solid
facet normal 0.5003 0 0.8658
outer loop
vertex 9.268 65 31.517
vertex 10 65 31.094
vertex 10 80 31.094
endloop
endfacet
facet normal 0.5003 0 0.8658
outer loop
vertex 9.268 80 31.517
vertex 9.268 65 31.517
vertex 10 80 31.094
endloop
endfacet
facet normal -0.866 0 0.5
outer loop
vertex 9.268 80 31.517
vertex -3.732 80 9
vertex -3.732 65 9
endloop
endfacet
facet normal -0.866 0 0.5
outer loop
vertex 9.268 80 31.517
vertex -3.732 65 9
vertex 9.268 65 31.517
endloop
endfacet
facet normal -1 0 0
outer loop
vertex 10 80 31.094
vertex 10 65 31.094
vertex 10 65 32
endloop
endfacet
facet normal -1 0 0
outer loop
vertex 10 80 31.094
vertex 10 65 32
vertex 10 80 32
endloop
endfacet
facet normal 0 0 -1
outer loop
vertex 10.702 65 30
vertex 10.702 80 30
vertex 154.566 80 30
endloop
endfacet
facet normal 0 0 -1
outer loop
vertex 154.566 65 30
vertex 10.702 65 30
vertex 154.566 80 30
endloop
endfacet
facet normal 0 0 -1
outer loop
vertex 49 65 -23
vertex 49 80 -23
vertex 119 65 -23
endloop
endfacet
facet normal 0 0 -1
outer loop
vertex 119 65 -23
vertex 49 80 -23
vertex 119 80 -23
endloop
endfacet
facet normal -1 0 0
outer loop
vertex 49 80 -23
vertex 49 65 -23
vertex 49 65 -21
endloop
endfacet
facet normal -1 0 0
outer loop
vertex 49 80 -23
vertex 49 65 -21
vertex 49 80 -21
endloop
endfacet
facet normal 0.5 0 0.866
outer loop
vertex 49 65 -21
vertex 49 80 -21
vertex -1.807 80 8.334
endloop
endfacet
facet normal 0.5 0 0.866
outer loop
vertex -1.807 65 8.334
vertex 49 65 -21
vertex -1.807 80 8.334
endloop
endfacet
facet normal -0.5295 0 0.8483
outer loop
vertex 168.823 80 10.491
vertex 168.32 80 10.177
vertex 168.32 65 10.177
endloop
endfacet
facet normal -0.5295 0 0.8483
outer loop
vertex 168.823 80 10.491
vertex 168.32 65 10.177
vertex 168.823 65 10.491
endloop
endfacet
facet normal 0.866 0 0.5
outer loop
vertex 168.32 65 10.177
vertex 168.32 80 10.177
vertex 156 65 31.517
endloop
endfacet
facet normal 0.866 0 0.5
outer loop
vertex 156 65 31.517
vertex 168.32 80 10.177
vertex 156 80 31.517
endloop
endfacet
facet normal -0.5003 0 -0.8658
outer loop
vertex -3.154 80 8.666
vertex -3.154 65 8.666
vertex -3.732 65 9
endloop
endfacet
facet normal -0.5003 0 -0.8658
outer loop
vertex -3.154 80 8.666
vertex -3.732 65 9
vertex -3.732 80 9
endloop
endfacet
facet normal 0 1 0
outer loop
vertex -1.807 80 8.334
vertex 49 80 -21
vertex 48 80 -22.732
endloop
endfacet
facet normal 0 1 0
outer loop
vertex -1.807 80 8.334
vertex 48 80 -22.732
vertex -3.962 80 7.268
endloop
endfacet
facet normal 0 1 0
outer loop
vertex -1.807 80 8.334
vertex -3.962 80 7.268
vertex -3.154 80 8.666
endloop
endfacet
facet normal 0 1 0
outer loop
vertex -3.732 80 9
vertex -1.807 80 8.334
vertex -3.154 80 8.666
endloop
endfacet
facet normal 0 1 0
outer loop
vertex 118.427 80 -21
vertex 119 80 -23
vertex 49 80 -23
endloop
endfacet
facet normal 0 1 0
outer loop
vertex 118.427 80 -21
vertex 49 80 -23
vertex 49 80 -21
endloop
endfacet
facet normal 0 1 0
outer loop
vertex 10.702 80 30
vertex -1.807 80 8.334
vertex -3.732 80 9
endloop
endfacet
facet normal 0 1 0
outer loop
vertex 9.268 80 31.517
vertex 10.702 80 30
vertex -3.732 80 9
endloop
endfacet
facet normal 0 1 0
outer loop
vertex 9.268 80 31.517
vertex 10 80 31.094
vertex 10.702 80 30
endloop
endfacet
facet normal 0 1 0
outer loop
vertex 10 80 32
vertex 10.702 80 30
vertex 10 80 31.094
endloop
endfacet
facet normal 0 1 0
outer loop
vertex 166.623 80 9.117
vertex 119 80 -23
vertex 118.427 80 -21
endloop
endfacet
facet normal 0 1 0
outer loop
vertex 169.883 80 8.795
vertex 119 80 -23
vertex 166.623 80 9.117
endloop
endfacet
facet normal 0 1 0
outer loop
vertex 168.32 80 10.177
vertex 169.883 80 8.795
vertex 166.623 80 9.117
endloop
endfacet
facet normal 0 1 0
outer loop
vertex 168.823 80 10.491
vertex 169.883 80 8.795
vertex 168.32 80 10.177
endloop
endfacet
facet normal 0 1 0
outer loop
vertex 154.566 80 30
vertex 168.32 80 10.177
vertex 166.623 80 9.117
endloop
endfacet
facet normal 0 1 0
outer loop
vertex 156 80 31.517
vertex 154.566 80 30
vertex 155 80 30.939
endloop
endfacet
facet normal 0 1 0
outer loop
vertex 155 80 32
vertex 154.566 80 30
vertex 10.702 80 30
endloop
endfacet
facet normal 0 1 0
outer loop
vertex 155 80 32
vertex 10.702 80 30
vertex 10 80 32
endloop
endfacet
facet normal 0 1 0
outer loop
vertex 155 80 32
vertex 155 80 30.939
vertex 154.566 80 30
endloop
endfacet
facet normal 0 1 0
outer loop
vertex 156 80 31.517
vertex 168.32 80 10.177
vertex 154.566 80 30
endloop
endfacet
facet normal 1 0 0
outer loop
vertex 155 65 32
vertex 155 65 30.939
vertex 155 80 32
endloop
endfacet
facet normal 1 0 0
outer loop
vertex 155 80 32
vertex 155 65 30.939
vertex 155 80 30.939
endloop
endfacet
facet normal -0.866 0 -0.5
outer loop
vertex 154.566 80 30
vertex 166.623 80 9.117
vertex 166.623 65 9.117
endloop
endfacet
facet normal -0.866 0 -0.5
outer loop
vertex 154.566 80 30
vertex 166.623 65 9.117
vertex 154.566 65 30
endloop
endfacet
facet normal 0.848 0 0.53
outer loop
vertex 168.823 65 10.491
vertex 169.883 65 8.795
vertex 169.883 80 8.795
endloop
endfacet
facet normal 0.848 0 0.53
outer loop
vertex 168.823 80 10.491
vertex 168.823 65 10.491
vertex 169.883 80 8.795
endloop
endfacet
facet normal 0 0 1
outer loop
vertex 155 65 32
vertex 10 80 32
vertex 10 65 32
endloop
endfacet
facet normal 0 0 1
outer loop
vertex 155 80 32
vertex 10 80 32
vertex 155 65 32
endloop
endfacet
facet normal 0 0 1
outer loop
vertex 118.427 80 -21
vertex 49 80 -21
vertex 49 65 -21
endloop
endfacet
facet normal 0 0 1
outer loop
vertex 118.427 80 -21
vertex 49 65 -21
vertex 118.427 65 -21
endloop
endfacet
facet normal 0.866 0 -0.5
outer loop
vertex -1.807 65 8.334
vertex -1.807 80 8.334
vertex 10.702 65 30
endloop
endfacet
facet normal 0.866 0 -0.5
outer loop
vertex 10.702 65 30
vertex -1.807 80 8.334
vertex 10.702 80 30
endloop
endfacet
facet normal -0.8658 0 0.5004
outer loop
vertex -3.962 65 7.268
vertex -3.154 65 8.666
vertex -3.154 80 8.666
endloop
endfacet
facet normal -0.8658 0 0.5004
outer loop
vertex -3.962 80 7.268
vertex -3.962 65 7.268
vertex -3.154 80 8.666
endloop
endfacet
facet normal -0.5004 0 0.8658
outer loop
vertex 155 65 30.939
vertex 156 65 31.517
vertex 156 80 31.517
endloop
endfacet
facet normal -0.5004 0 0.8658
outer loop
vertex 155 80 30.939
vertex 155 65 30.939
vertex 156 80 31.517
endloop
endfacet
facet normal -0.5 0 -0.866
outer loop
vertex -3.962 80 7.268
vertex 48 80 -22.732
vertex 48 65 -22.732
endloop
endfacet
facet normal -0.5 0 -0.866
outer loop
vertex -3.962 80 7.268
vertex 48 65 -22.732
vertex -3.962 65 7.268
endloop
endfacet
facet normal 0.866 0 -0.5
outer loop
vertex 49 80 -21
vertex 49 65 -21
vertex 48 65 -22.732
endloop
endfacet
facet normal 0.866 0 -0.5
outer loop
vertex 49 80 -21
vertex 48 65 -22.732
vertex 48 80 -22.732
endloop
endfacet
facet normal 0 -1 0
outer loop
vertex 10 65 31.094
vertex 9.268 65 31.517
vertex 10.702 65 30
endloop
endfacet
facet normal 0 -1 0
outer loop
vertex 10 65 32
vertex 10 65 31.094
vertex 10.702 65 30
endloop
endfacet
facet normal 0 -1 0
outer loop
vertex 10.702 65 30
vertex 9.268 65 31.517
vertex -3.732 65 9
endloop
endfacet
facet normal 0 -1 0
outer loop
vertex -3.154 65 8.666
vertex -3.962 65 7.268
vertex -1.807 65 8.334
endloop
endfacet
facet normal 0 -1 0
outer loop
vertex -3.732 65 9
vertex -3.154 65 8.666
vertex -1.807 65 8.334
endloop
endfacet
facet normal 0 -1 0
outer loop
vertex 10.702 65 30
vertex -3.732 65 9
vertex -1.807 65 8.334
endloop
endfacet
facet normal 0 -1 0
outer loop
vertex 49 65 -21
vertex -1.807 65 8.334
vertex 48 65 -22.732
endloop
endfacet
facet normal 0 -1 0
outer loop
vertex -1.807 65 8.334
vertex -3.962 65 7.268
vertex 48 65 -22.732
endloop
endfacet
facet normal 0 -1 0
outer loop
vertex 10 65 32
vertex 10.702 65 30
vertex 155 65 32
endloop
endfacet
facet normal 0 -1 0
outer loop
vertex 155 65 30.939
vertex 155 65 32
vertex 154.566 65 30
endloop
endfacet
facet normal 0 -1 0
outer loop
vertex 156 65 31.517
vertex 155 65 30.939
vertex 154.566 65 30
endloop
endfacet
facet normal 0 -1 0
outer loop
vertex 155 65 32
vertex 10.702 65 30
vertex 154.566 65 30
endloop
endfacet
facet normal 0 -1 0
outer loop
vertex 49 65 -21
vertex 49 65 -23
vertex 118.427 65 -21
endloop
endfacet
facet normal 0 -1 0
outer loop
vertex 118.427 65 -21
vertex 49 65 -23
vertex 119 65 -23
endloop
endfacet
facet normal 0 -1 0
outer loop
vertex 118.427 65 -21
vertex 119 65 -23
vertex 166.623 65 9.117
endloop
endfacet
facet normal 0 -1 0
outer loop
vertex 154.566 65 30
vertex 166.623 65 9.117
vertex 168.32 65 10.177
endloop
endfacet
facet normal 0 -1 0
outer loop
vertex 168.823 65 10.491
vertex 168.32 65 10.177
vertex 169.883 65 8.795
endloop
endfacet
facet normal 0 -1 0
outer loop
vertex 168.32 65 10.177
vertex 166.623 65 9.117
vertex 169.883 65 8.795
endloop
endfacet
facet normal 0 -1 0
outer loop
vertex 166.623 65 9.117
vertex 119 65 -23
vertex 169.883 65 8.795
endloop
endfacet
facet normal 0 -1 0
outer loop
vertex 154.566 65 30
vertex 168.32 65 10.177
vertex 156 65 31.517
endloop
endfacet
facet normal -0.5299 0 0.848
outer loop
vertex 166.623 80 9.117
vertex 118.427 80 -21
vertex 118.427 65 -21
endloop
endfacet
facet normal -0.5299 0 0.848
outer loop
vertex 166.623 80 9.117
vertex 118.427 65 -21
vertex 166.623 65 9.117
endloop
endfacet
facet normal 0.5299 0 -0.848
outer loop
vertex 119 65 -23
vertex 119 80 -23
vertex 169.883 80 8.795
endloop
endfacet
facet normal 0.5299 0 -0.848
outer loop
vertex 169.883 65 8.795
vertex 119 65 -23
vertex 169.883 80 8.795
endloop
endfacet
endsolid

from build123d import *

# Parameters (mm, degrees)
BOX001002001_W                     = 70
BOX001002001_H                     = 15
BOX001002001_DEPTH                 = 2
BOX001002001002_W                  = 60
BOX001002001002_H                  = 15
BOX001002001002_DEPTH              = 2
BOX001002001002_PLACEMENT_ANGLE    = 209.99999
BOX001002001001_W                  = 60
BOX001002001001_H                  = 15
BOX001002001001_DEPTH              = 2
BOX001002001001_PITCH_ANGLE        = -31.999951
BOX001002001003_W                  = 26
BOX001002001003_H                  = 15
BOX001002001003_DEPTH              = 2
BOX001002001003_PLACEMENT_ANGLE    = 60.000023
BOX001002001003001_W               = 26
BOX001002001003001_H               = 15
BOX001002001003001_DEPTH           = 2
BOX001002001003001_PLACEMENT_ANGLE = 119.999977
BOX001002_W                        = 145
BOX001002_H                        = 15
BOX001002_DEPTH                    = 2


with BuildPart() as box001002001:
    # Box001002001 → Box001002001 (new body)
    with BuildSketch(Plane(origin=(49, -20, -23), x_dir=(1, 0, 0), z_dir=(0, 0, 1))):
        with Locations((35, 7.5)):
            Rectangle(BOX001002001_W, BOX001002001_H)
    extrude(amount=BOX001002001_DEPTH)


with BuildPart() as box001002001002:
    # Box001002001002 → Box001002001002 (new body)
    with BuildSketch(Plane.XY):
        with Locations((30, 7.5)):
            Rectangle(BOX001002001002_W, BOX001002001002_H)
    extrude(amount=BOX001002001002_DEPTH)


with BuildPart() as box001002001002_1:
    # Box001002001002 placement: moved
    add(box001002001002.part.moved(Location((49, -20, -21))).rotate(Axis((49, -20, -21), (0, 1, 0)), BOX001002001002_PLACEMENT_ANGLE))


with BuildPart() as box001002001001:
    # Box001002001001 → Box001002001001 (new body)
    with BuildSketch(Plane.XY):
        with Locations((30, 7.5)):
            Rectangle(BOX001002001001_W, BOX001002001001_H)
    extrude(amount=BOX001002001001_DEPTH)


with BuildPart() as box001002001001_1:
    # Box001002001001 pitch: moved
    add(box001002001001.part.rotate(Axis((0, 0, 0), (0, 1, 0)), BOX001002001001_PITCH_ANGLE))


with BuildPart() as box001002001001_2:
    # Box001002001001 placement: moved
    add(box001002001001_1.part.moved(Location((119, -20, -23))))


with BuildPart() as box001002001003:
    # Box001002001003 → Box001002001003 (new body)
    with BuildSketch(Plane.XY):
        with Locations((13, 7.5)):
            Rectangle(BOX001002001003_W, BOX001002001003_H)
    extrude(amount=BOX001002001003_DEPTH)


with BuildPart() as box001002001003_1:
    # Box001002001003 placement: moved
    add(box001002001003.part.moved(Location((-2, -20, 8))).rotate(Axis((-2, -20, 8), (0, -1, 0)), BOX001002001003_PLACEMENT_ANGLE))


with BuildPart() as box001002001003001:
    # Box001002001003001 → Box001002001003001 (new body)
    with BuildSketch(Plane.XY):
        with Locations((13, 7.5)):
            Rectangle(BOX001002001003001_W, BOX001002001003001_H)
    extrude(amount=BOX001002001003001_DEPTH)


with BuildPart() as box001002001003001_1:
    # Box001002001003001 placement: moved
    add(box001002001003001.part.moved(Location((169, -20, 9))).rotate(Axis((169, -20, 9), (0, -1, 0)), BOX001002001003001_PLACEMENT_ANGLE))


with BuildPart() as caterpiller2:
    # Box001002 → Box001002 (new body)
    with BuildSketch(Plane(origin=(10, -20, 30), x_dir=(1, 0, 0), z_dir=(0, 0, 1))):
        with Locations((72.5, 7.5)):
            Rectangle(BOX001002_W, BOX001002_H)
    extrude(amount=BOX001002_DEPTH)

    # Fusion002001002001: union Box001002001, Box001002001002, Box001002001001, Box001002001003, Box001002001003001
    add(box001002001.part)
    add(box001002001002_1.part)
    add(box001002001001_2.part)
    add(box001002001003_1.part)
    add(box001002001003001_1.part)


with BuildPart() as caterpiller2_1:
    # Fusion002001002001 placement: moved
    add(caterpiller2.part.moved(Location((0, 85, 0))))


solid = caterpiller2_1.part
